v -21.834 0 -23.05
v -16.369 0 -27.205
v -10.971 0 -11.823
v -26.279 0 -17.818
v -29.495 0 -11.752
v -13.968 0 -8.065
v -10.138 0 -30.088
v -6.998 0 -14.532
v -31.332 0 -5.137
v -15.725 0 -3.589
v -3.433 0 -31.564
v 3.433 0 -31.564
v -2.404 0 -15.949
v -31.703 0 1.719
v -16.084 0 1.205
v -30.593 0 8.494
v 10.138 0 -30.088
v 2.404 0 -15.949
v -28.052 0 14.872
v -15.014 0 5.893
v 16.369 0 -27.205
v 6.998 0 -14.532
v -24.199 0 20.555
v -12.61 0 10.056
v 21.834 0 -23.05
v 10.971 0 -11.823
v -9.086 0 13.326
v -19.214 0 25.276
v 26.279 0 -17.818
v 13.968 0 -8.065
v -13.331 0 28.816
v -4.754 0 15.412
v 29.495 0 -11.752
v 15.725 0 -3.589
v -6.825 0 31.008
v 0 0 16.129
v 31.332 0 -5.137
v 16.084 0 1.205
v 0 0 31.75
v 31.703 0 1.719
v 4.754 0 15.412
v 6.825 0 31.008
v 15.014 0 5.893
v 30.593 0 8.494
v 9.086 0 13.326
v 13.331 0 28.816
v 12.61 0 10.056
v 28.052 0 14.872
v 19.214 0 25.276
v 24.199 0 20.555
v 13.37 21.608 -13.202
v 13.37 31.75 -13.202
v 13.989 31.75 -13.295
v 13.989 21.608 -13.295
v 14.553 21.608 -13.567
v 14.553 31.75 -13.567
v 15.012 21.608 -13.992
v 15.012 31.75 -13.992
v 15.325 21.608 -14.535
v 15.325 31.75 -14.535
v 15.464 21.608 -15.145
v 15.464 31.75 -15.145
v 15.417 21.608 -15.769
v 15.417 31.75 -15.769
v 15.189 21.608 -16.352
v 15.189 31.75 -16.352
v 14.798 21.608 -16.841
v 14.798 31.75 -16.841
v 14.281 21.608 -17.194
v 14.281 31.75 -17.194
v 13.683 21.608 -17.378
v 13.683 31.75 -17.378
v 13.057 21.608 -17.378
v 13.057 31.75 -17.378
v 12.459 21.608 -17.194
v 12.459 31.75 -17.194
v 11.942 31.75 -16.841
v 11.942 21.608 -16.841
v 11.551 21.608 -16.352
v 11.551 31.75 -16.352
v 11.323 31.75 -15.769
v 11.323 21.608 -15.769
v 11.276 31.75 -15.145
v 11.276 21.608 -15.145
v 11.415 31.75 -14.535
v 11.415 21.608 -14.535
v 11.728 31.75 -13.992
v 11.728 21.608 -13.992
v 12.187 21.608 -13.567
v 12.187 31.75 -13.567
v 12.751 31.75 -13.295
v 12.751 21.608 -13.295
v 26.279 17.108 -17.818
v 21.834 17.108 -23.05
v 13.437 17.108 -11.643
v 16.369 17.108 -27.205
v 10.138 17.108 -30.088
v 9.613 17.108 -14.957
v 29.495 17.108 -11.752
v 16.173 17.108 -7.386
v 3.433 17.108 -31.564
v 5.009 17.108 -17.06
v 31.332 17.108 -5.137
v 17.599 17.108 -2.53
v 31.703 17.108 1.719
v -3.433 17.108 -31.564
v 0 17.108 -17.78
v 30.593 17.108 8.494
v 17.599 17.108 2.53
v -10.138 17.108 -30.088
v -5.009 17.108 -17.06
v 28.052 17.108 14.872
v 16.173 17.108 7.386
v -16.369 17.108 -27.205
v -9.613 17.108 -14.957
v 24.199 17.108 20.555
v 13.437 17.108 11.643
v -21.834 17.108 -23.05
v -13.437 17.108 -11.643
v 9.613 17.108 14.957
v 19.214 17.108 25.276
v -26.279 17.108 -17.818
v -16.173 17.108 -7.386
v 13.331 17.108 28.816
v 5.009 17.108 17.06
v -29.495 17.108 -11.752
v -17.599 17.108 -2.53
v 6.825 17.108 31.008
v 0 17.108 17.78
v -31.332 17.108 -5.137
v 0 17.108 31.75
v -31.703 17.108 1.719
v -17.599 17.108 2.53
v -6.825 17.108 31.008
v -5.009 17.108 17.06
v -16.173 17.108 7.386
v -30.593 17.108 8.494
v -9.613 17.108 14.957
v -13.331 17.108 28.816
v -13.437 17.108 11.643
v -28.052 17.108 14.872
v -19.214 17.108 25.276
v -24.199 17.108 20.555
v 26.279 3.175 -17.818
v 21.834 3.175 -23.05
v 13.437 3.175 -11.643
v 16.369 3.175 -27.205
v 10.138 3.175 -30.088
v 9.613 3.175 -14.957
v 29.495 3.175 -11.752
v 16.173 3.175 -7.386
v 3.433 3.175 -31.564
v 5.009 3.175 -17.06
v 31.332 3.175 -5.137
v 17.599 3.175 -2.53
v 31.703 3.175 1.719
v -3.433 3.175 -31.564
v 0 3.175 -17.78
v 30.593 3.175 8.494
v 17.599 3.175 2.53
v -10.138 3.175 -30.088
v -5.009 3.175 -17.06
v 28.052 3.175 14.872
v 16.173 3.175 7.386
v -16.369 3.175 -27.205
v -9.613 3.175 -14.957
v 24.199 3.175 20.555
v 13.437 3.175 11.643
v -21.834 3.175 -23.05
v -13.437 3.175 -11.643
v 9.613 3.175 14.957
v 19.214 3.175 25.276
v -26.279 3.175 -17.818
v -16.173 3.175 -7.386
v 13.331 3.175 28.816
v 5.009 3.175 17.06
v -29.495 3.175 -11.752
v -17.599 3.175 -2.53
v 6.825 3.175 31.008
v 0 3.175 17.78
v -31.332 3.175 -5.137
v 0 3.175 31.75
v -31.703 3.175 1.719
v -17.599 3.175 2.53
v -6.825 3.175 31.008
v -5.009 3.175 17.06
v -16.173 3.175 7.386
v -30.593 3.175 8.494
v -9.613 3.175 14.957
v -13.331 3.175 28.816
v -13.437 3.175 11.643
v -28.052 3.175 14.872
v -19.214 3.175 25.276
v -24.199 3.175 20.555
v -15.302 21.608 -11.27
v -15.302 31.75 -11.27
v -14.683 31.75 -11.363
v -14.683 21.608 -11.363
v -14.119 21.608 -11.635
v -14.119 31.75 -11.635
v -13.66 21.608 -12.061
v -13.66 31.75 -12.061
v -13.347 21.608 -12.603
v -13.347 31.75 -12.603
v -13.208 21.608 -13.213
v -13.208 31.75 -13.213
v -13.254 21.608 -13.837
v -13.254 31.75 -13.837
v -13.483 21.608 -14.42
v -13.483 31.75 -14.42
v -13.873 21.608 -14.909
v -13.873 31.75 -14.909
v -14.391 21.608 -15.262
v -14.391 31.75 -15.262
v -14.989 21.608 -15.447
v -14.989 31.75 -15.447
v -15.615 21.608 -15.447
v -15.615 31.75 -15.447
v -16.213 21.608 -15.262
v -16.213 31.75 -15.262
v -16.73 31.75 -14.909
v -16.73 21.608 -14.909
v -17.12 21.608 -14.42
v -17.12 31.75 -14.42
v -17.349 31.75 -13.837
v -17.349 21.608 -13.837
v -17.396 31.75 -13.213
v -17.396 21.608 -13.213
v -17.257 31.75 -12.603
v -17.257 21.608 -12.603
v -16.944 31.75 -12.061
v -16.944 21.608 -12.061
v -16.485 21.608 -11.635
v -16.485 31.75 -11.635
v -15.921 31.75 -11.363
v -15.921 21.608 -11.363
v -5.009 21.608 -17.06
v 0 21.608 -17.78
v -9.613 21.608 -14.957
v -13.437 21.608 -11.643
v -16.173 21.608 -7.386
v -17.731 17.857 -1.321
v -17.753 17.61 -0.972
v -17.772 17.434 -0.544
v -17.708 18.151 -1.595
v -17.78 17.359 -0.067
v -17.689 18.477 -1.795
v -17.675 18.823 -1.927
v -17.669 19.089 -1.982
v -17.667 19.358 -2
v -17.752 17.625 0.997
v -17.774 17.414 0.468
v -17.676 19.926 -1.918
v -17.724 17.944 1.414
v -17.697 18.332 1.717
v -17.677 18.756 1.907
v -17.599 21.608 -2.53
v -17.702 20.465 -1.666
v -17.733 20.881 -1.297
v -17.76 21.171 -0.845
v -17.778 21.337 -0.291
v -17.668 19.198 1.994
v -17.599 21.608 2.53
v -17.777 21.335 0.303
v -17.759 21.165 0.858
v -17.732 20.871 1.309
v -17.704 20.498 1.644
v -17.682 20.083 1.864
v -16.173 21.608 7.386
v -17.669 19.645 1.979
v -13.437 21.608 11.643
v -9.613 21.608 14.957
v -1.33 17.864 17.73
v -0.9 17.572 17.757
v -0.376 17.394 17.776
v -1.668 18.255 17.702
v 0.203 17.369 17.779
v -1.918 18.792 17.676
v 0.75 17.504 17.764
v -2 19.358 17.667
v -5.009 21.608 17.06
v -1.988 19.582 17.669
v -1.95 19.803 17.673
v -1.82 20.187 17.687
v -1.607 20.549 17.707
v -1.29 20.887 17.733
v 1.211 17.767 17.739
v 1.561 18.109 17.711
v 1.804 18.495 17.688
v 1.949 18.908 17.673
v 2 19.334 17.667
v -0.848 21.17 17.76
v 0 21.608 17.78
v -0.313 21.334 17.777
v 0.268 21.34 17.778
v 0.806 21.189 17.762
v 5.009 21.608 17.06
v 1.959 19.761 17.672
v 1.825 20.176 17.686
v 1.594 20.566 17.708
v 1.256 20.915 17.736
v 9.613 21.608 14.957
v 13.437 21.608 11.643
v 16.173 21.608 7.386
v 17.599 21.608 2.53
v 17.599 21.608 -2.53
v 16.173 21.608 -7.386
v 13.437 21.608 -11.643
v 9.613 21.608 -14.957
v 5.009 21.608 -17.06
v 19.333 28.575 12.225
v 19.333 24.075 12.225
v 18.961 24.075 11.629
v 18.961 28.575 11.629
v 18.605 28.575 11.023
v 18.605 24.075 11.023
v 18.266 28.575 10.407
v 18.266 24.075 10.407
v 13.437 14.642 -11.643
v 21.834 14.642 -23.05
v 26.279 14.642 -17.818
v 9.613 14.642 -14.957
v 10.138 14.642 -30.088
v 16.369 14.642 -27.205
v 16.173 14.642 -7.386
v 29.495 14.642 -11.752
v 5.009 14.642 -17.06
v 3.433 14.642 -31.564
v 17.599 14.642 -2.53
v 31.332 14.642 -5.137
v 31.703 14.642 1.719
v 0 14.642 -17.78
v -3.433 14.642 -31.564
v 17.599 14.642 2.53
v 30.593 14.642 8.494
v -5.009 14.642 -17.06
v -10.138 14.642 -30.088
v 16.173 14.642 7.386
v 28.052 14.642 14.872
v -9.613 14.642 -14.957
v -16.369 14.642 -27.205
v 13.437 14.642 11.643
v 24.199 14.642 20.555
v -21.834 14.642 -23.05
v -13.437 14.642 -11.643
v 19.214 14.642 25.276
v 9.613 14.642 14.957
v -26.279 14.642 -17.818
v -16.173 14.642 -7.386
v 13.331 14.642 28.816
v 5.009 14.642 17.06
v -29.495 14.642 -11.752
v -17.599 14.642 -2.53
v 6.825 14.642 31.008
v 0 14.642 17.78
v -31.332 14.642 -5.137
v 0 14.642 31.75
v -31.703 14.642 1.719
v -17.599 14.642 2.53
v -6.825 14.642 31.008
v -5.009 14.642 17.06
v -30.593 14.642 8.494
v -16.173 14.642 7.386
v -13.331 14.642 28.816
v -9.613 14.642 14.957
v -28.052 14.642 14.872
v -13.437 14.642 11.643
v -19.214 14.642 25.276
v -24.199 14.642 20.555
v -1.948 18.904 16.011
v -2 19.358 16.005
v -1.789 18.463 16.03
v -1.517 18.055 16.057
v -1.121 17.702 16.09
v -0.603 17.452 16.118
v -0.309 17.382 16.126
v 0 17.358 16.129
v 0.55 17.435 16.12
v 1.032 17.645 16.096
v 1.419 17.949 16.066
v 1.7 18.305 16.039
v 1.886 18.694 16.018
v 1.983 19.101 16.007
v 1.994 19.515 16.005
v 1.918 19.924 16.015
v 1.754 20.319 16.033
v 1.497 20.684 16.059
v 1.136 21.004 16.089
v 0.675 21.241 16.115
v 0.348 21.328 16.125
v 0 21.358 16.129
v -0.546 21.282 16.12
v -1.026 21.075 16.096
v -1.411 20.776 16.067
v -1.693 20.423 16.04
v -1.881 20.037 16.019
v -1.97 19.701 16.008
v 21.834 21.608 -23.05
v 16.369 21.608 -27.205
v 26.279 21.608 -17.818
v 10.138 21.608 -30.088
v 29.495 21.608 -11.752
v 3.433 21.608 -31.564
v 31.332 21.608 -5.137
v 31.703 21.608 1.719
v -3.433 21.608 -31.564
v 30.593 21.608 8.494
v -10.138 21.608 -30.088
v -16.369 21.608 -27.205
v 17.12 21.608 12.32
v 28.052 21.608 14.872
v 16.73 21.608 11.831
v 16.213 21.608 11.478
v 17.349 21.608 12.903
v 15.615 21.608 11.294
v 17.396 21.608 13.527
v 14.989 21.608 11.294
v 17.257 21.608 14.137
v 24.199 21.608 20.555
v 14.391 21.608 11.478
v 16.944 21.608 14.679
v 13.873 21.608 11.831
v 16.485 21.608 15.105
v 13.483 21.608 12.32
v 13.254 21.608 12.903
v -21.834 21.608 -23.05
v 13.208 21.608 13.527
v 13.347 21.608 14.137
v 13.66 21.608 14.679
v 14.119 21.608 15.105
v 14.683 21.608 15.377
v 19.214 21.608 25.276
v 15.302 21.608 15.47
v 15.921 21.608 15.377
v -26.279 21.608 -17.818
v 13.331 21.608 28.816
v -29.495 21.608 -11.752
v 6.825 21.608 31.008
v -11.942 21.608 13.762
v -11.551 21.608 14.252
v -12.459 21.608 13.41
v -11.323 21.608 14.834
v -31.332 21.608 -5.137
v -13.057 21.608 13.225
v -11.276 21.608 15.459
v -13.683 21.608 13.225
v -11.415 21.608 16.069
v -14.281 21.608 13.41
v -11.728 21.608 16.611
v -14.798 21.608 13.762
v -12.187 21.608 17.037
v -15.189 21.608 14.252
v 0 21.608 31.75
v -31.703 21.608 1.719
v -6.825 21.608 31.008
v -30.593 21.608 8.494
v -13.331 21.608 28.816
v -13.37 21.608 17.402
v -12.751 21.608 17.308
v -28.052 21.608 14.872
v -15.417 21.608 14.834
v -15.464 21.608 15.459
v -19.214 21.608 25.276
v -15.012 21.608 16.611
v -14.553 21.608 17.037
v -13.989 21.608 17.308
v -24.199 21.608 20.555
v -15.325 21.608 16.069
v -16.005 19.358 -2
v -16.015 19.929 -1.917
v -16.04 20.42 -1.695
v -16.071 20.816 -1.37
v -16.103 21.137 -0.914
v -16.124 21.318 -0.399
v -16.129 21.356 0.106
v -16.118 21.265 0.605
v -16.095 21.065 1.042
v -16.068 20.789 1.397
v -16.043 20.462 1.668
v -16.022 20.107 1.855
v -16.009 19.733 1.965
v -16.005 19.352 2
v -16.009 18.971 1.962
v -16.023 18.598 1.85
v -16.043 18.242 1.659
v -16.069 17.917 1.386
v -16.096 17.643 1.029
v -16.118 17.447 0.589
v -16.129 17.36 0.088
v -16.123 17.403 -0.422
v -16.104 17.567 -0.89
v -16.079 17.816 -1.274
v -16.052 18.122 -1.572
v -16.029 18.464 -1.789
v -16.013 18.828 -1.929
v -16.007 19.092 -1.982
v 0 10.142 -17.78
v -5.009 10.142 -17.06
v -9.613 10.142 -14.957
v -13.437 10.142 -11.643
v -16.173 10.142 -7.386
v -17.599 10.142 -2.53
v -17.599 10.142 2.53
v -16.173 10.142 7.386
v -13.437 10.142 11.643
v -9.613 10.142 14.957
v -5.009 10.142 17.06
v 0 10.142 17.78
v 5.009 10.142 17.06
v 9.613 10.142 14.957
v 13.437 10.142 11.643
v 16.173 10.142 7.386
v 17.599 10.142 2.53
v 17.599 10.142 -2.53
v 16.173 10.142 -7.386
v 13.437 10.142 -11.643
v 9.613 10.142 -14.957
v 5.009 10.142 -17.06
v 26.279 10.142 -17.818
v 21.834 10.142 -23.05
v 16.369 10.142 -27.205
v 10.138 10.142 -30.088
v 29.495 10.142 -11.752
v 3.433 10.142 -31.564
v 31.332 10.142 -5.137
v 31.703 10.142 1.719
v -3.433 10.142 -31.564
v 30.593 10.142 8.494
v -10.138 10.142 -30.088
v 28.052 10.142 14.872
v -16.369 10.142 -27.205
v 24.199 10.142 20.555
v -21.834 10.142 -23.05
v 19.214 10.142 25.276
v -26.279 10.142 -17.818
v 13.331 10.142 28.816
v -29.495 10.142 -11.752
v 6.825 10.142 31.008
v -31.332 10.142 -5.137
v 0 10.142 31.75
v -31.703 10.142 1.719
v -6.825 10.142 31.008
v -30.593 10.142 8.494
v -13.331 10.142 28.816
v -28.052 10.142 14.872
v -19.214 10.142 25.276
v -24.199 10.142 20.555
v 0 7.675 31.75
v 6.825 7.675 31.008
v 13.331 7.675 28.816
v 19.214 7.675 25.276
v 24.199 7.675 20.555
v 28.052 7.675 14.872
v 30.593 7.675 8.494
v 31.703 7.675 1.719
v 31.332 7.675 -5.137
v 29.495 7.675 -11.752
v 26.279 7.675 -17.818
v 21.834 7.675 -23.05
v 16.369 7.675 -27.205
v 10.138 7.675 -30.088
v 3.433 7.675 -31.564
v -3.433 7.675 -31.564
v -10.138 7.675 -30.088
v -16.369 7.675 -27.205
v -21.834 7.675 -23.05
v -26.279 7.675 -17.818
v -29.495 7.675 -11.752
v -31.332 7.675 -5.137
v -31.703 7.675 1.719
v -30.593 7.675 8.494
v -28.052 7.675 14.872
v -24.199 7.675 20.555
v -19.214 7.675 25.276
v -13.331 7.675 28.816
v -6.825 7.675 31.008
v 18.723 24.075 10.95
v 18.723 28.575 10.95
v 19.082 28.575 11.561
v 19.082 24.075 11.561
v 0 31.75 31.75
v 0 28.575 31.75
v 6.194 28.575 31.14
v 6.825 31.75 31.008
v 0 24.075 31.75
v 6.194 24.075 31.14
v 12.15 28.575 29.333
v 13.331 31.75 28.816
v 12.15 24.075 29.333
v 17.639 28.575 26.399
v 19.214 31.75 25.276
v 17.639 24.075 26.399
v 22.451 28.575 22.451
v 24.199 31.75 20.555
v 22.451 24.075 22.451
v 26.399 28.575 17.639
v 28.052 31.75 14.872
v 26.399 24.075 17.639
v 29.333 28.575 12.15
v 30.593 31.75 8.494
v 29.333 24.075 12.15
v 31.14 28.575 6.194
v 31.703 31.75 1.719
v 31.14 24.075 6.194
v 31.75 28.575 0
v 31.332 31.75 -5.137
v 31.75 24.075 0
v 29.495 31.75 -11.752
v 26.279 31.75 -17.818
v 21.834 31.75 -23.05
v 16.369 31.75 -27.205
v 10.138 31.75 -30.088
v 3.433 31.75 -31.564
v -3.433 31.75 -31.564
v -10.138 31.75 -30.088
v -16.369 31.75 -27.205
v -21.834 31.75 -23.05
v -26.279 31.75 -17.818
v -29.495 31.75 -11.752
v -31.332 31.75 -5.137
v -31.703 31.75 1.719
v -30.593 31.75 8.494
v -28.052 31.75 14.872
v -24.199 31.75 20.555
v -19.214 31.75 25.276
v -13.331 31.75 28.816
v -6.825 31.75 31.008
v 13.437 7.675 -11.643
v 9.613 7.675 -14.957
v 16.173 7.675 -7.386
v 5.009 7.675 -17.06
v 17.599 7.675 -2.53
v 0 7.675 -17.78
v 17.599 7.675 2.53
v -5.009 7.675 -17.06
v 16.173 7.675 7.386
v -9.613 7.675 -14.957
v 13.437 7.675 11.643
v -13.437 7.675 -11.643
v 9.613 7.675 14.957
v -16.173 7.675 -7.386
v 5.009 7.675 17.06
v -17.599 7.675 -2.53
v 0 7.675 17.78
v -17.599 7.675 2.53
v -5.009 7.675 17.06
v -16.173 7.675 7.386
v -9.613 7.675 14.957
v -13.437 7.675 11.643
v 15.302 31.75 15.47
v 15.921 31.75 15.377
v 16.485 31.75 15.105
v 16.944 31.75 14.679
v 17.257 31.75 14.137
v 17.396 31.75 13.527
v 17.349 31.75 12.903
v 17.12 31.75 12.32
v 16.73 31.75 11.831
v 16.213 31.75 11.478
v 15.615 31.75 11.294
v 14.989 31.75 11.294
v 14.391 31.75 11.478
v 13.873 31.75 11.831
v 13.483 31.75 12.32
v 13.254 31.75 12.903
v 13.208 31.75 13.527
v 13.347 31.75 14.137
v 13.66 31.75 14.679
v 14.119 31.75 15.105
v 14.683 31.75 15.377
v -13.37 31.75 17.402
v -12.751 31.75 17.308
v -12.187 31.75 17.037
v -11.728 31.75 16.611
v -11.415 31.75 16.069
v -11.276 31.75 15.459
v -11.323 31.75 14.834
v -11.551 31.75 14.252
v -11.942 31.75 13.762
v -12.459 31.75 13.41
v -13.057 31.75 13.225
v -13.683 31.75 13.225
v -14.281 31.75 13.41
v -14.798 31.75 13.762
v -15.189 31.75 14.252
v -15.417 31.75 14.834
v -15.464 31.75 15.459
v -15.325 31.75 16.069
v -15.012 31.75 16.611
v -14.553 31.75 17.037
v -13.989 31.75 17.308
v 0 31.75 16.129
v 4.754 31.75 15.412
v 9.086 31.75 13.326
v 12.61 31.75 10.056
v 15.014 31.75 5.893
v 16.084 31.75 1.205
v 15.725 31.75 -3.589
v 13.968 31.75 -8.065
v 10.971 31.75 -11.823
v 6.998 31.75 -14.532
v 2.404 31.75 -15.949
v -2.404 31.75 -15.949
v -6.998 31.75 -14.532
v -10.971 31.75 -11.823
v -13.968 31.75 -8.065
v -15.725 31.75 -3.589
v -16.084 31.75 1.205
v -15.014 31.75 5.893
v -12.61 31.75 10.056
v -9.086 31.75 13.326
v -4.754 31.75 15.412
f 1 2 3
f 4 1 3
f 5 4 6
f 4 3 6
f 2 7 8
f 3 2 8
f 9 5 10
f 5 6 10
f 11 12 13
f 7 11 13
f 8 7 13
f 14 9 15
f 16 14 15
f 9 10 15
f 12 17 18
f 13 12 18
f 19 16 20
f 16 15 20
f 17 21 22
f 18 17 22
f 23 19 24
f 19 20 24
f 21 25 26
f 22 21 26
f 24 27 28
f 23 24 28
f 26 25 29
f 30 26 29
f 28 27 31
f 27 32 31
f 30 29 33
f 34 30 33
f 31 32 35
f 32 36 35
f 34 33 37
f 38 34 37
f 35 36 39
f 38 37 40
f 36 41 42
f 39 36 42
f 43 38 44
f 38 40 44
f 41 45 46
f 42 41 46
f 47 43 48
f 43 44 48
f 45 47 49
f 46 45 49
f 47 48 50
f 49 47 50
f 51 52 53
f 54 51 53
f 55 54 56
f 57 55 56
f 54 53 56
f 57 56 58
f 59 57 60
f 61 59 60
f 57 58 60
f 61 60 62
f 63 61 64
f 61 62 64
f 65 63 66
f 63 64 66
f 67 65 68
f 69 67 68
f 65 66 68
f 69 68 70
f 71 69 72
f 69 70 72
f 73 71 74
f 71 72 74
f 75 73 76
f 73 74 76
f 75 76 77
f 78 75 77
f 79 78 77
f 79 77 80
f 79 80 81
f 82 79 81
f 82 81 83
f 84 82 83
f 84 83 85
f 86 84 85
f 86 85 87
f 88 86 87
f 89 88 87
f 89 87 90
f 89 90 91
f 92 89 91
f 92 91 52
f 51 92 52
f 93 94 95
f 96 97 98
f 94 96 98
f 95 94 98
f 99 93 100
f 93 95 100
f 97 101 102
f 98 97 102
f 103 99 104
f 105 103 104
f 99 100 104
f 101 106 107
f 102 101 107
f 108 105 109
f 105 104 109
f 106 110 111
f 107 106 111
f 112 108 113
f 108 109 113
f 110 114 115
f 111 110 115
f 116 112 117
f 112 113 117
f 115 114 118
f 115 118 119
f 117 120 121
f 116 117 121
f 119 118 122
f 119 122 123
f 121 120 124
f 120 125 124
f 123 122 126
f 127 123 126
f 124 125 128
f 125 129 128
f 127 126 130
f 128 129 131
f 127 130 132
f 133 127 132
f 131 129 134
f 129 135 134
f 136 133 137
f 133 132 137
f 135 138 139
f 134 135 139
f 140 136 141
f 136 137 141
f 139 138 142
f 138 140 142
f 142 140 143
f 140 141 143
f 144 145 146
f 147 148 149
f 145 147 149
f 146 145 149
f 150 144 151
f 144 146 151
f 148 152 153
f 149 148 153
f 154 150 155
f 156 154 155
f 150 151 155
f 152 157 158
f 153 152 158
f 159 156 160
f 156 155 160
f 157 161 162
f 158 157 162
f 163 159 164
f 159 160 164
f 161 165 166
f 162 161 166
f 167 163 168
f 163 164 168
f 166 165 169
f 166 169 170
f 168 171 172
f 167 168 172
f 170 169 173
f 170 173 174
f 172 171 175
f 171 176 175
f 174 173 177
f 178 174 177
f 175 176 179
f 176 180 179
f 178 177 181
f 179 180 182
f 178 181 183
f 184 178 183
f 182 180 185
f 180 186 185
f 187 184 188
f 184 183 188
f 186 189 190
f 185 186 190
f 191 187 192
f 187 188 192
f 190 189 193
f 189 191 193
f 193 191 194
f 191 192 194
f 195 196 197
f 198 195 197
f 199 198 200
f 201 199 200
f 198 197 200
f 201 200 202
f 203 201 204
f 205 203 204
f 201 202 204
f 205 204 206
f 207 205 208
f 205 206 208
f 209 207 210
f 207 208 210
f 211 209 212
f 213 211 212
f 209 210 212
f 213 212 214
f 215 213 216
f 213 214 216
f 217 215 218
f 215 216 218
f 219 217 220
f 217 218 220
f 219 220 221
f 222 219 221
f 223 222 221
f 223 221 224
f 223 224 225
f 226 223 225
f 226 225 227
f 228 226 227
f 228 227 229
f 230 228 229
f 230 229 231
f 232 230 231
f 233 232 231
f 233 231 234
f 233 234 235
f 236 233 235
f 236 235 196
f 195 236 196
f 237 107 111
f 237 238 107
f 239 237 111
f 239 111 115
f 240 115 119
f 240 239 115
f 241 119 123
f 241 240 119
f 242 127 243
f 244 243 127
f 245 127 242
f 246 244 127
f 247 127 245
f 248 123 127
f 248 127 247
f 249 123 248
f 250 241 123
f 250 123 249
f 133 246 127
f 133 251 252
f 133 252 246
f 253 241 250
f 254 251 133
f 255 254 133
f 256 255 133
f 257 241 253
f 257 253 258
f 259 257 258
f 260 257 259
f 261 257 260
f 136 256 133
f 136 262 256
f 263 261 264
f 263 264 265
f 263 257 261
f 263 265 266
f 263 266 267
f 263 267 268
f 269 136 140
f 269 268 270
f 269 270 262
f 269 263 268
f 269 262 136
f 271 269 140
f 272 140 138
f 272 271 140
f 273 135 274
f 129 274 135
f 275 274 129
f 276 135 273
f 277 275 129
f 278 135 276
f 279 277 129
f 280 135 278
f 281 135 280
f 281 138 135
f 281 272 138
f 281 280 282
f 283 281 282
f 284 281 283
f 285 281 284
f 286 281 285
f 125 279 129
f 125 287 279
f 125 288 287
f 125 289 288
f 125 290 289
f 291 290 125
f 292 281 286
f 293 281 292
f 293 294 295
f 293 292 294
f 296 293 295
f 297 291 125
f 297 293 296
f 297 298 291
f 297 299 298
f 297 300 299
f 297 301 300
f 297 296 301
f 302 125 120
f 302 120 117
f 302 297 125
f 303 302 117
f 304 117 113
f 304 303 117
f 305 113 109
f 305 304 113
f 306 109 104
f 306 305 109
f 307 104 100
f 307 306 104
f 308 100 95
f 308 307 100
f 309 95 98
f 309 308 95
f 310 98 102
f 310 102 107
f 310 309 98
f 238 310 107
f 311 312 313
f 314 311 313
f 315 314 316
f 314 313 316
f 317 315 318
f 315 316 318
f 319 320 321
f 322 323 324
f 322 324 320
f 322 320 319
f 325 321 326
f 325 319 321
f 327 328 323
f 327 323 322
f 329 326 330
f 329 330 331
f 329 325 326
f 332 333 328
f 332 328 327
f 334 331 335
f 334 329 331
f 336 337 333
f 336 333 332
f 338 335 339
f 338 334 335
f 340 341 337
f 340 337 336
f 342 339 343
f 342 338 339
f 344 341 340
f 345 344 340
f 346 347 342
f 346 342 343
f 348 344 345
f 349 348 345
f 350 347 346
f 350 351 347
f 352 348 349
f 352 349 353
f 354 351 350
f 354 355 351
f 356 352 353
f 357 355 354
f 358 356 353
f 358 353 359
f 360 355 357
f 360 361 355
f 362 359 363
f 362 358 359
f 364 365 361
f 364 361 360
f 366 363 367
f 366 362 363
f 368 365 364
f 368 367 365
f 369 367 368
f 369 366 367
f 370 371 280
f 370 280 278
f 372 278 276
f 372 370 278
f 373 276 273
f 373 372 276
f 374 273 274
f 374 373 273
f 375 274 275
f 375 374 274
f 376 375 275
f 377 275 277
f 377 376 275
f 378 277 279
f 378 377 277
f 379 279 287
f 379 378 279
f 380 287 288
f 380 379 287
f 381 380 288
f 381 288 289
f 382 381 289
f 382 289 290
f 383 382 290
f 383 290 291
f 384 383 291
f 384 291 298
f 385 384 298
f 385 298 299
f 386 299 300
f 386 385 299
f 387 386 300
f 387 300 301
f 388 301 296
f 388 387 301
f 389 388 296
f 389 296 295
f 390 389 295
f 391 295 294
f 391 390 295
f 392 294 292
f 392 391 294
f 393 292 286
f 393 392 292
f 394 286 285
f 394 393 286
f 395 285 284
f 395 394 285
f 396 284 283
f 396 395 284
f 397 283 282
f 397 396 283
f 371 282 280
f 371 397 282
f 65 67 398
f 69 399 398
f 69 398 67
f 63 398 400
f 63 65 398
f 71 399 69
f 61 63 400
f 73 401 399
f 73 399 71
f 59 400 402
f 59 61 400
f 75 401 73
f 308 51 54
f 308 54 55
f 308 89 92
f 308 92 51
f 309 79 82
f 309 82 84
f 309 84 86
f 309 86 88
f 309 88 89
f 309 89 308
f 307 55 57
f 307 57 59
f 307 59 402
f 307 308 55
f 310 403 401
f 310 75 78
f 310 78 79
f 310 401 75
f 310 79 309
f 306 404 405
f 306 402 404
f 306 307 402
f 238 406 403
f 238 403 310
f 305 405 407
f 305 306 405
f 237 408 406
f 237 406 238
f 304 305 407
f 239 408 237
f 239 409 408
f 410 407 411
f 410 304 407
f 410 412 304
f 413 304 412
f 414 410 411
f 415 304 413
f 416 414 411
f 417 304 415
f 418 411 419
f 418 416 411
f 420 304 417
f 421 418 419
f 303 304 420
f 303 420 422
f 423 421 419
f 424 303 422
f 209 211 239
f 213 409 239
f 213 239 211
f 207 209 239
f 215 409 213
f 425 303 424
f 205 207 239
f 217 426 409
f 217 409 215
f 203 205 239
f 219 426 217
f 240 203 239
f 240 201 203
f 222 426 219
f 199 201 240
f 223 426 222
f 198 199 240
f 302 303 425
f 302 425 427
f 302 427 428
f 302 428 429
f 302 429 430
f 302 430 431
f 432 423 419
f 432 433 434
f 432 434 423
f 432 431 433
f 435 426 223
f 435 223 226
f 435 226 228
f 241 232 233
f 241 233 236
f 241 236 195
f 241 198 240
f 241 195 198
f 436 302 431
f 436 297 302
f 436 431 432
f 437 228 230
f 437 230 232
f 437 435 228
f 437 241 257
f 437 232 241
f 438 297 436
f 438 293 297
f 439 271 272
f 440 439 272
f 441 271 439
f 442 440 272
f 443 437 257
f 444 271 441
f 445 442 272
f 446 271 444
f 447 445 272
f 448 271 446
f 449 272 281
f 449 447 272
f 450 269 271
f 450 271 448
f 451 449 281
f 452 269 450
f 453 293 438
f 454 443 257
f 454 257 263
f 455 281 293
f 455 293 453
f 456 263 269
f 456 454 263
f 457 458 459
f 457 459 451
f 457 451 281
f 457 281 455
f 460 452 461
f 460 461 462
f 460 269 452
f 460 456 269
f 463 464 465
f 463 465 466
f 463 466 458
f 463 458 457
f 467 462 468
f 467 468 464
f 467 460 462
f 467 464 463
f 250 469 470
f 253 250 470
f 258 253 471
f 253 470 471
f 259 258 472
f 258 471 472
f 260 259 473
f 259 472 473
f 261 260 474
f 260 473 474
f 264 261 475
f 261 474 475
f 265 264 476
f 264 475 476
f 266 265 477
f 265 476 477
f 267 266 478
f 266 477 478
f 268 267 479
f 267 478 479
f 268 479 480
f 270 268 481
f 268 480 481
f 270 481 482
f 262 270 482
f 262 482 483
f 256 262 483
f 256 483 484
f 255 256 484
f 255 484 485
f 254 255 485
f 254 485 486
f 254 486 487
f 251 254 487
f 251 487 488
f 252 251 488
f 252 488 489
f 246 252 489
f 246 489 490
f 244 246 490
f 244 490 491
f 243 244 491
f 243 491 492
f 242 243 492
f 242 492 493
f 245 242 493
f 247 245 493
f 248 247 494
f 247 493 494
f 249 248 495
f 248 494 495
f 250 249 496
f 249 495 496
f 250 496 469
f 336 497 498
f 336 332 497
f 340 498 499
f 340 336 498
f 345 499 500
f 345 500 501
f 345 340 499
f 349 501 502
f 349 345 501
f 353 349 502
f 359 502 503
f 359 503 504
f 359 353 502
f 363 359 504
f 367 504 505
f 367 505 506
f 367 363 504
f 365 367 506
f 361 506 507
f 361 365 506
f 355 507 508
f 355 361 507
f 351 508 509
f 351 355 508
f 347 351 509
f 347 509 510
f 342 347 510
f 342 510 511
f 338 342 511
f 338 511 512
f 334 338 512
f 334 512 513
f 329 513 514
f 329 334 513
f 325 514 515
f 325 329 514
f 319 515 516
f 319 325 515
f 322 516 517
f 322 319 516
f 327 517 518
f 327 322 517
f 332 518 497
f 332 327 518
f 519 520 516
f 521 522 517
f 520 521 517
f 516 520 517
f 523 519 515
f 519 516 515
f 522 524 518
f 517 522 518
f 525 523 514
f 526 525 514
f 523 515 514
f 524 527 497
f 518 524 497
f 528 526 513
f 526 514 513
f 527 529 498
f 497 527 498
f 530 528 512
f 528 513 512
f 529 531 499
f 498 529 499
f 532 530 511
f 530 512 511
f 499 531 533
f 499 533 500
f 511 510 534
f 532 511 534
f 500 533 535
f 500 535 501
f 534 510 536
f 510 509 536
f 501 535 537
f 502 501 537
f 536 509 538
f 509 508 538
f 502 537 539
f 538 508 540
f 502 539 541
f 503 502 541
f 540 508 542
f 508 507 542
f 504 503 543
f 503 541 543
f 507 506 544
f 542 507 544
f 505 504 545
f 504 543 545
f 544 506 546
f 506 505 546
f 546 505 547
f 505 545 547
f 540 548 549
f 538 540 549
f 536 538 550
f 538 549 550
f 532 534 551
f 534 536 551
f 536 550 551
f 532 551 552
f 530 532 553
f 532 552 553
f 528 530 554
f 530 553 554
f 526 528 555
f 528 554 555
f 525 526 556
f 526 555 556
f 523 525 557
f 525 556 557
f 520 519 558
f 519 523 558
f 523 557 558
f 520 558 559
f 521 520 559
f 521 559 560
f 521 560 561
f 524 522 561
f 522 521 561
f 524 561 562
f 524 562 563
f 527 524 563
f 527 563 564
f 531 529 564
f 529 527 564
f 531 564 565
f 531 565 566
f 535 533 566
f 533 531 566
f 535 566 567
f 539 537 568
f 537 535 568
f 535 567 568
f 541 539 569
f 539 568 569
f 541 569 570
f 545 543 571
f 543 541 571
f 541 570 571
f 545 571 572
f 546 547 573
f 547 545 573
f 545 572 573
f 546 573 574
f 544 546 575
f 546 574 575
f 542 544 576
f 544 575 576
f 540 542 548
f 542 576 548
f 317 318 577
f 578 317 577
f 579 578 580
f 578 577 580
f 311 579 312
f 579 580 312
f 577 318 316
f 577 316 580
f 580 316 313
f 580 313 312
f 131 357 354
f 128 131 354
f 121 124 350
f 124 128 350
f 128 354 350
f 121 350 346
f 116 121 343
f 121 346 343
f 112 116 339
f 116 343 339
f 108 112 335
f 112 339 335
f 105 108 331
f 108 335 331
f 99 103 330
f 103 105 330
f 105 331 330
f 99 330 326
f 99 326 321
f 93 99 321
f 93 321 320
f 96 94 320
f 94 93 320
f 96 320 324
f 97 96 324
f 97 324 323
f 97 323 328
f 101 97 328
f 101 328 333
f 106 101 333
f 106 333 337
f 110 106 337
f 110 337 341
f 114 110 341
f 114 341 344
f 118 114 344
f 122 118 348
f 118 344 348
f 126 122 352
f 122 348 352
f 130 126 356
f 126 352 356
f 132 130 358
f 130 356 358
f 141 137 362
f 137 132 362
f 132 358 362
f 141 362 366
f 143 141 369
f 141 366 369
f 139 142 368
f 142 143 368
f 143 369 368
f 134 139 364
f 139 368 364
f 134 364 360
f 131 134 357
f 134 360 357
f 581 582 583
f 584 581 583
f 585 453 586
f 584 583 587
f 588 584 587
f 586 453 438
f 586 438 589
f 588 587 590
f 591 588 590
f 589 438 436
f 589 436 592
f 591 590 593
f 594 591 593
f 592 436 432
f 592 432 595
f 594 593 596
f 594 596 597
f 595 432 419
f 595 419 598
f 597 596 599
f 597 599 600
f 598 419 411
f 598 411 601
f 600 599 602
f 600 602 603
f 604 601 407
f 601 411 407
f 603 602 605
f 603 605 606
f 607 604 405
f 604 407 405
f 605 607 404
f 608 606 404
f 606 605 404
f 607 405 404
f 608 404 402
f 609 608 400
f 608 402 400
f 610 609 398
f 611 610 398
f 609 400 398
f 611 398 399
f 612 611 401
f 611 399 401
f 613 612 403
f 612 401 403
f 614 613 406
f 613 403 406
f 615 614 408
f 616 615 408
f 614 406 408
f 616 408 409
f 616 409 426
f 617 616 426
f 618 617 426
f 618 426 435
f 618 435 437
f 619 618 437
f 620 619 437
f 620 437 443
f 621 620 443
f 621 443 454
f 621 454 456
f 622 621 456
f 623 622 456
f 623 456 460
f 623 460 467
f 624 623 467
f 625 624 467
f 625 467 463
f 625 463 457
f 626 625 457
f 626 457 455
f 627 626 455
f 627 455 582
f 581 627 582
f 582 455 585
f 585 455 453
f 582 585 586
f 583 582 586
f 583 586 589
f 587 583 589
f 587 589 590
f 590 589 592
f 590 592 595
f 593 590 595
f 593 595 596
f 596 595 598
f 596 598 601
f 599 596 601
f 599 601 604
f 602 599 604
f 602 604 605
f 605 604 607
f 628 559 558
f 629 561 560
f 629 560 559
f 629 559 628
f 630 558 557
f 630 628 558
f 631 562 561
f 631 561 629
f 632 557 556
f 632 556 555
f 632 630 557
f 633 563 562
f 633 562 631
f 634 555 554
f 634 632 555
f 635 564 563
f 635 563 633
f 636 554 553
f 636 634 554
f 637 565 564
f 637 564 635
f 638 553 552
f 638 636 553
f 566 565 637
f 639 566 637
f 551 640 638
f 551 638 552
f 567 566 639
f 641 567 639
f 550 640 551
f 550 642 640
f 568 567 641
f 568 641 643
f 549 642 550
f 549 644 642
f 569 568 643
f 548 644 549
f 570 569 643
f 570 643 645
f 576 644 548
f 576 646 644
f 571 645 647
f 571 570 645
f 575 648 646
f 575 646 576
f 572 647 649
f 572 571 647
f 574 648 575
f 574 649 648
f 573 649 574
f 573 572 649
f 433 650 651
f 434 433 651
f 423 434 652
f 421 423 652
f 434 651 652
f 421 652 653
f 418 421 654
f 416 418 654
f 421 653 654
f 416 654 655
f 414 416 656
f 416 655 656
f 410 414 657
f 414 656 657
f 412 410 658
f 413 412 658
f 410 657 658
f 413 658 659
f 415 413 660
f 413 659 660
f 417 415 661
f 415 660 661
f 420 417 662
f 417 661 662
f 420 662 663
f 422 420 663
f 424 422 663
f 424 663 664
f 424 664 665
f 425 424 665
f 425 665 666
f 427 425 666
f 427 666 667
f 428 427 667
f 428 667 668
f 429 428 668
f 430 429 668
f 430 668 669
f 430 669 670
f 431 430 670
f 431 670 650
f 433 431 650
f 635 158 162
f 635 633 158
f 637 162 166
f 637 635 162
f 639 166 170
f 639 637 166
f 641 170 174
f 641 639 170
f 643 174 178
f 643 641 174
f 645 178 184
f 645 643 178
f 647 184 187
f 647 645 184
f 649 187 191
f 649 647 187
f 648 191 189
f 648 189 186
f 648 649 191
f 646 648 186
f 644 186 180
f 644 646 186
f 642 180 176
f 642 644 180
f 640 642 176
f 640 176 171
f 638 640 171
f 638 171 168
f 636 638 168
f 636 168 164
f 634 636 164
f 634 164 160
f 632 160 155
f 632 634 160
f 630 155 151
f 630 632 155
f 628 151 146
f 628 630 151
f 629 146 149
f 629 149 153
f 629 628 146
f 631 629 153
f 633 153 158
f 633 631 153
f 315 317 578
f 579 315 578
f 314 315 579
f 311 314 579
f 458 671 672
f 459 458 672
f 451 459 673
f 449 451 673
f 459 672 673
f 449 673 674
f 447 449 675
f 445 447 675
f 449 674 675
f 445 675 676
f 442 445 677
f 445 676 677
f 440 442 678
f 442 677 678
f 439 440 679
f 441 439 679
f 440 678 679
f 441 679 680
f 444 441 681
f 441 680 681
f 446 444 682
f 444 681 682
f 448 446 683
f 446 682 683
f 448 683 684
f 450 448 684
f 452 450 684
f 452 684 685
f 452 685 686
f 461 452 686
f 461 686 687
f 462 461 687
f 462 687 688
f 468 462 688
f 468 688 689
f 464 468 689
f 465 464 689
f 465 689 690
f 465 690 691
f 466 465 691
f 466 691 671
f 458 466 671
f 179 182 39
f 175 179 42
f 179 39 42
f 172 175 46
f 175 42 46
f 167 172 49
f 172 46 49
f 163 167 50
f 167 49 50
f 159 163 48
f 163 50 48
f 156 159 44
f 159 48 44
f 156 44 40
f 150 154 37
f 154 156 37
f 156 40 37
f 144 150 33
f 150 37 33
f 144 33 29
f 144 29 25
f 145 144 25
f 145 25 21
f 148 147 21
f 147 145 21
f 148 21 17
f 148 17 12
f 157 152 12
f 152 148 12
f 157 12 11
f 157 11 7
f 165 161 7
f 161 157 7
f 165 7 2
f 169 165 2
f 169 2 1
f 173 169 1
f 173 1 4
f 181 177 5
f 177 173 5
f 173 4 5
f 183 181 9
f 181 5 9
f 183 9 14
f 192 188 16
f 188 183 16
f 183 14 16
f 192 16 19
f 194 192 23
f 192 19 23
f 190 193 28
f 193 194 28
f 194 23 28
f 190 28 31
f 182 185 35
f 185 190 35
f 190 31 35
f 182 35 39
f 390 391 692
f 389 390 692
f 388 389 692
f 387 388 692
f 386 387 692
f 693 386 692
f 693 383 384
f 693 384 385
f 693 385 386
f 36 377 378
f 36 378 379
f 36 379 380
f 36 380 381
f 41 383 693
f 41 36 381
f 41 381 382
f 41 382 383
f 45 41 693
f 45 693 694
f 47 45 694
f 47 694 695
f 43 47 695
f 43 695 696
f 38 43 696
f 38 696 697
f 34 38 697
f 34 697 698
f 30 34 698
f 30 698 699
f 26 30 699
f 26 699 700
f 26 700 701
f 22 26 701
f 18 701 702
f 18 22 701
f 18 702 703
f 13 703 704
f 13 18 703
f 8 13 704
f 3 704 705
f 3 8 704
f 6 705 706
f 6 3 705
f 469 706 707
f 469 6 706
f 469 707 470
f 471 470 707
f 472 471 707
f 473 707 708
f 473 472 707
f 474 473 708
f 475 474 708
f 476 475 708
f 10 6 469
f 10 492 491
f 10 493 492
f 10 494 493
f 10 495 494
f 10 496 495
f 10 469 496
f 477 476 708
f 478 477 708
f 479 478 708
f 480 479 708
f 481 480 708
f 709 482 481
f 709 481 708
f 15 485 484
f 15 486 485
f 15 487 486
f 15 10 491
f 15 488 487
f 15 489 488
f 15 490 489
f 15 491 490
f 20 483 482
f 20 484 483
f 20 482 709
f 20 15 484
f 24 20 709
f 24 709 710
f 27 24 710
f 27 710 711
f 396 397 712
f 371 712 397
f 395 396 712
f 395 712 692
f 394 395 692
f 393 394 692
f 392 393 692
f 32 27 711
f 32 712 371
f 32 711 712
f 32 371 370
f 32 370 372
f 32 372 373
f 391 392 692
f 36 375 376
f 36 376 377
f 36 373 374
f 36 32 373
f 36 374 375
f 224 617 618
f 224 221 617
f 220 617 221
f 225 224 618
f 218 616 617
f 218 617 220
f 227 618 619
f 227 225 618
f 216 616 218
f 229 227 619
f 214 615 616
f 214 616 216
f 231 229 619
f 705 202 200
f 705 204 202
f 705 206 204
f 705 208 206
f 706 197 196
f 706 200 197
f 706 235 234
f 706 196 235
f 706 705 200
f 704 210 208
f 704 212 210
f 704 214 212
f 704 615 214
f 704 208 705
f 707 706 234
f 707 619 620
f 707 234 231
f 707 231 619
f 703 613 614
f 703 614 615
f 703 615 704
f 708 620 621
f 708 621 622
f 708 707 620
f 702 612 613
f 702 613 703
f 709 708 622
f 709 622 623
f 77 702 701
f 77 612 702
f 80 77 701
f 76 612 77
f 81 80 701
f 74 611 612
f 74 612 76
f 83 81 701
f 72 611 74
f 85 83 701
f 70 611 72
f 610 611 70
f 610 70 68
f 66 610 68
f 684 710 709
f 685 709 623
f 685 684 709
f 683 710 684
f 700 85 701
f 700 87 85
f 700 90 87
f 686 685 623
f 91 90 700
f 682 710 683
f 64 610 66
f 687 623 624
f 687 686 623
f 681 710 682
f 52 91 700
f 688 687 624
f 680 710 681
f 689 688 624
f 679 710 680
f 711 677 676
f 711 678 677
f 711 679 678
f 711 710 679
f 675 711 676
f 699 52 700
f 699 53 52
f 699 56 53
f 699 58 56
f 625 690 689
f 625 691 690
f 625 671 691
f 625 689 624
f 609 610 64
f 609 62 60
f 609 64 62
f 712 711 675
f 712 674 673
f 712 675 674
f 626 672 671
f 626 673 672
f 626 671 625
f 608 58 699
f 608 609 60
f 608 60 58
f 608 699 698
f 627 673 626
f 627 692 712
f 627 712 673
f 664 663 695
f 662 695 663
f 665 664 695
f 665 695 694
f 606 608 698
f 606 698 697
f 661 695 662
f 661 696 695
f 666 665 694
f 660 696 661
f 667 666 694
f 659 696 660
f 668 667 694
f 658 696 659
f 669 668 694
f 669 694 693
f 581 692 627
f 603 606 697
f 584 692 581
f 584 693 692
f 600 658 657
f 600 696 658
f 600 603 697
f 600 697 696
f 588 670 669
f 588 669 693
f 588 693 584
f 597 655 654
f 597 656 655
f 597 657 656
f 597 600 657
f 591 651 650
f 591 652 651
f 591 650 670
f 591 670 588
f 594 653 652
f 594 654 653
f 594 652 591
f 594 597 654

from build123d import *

# Parameters (mm, degrees)
SKETCH1_R                        = 31.75
SKETCH1_R_2                      = 16.129
BOSS_EXTRUDE1_DEPTH              = 31.75
SKETCH2_W                        = 13.97
SKETCH2_H                        = 4.5
BOSS_EXTRUDE2_START              = -7.675
BOSS_EXTRUDE2_OUTLINE_R          = 31.75
BOSS_EXTRUDE2_OUTLINE_R_2        = 17.78
BOSS_EXTRUDE2_DEPTH              = 4.5
CUT_EXTRUDE2_REACH               = 56.993
CUT_EXTRUDE2_END_RADIUS          = 17.78
SKETCH8_R                        = 2
CUT_EXTRUDE3_REACH               = 56.993
CUT_EXTRUDE3_END_RADIUS          = 17.78
SKETCH9_R                        = 2
SKETCH10_R                       = 1
CUT_EXTRUDE4_DEPTH               = 10.141666667
TAP_DRILL_FOR_M5X0_8_TAP1_REACH  = 74.51
TAP_DRILL_FOR_M5X0_8_TAP1_BORE_R = 2.1


# Read off the part's stored shape, not the designer's step: Boss-Extrude2
with BuildPart() as part:
    # Sketch1 → Boss-Extrude1 (new body)
    with BuildSketch(Plane(origin=(0, 0, 0), x_dir=(1, 0, 0), z_dir=(0, 1, 0))):
        with Locations(Location((0, 0, 0), (0, 0, 270))):
            Circle(SKETCH1_R)
        with Locations(Location((0, 0, 0), (0, 0, 270))):
            Circle(SKETCH1_R_2, mode=Mode.SUBTRACT)
    extrude(amount=BOSS_EXTRUDE1_DEPTH)

    # Sketch2 → Cut-Revolve2 (revolve, cut)
    with BuildSketch(Plane.XY, mode=Mode.PRIVATE) as cut_revolve2_sk:
        with Locations((24.765, 26.325)):
            Rectangle(SKETCH2_W, SKETCH2_H)
        with Locations((24.765, 12.391666667)):
            Rectangle(SKETCH2_W, SKETCH2_H)
        with Locations((24.765, 5.425)):
            Rectangle(SKETCH2_W, SKETCH2_H)
        with Locations((24.765, 19.358333333)):
            Rectangle(SKETCH2_W, SKETCH2_H)
    revolve(cut_revolve2_sk.sketch.rotate(Axis((0, 0, 0), (0, 1, 0)), 90), axis=Axis((0, 0, 0), (0, 1, 0)), mode=Mode.SUBTRACT)

    # Boss-Extrude2 outline → Boss-Extrude2 (add)
    with BuildSketch(Plane(origin=(0, 31.75, 0), x_dir=(1, 0, 0), z_dir=(0, 1, 0)).offset(BOSS_EXTRUDE2_START)):
        Circle(BOSS_EXTRUDE2_OUTLINE_R)
        with BuildLine():
            ThreePointArc((18.265610967, -10.406997066), (18.915681572, -11.247857531), (19.33332562, -12.225206784))
            ThreePointArc((19.33332562, -12.225206784), (18.780593277, -11.327185978), (18.265610967, -10.406997066))
        make_face(mode=Mode.SUBTRACT)
        Circle(BOSS_EXTRUDE2_OUTLINE_R_2, mode=Mode.SUBTRACT)
    extrude(amount=BOSS_EXTRUDE2_DEPTH)

    # Cut-Extrude2: up to this cylinder (the profile starts inside it)
    cut_extrude2_end = Plane(origin=(0, 19.358333, 0), z_dir=(0, -1, 0)) * Cylinder(CUT_EXTRUDE2_END_RADIUS, 150.546, mode=Mode.PRIVATE)
    # Sketch8 → Cut-Extrude2 (cut, up to the surface)
    with BuildSketch(Plane.XY, mode=Mode.PRIVATE) as cut_extrude2_sk1:
        with Locations(Location((0, 19.358333333, 0), (0, 0, 180))):
            Circle(SKETCH8_R)
    cut_extrude2_tool1 = extrude(cut_extrude2_sk1.sketch, amount=CUT_EXTRUDE2_REACH, mode=Mode.PRIVATE) & cut_extrude2_end
    add(cut_extrude2_tool1.solids().sort_by_distance((0, 19.358333, 0))[0], mode=Mode.SUBTRACT)

    # Cut-Extrude3: up to this cylinder (the profile starts inside it)
    cut_extrude3_end = Plane(origin=(0, 19.358333, 0), z_dir=(0, -1, 0)) * Cylinder(CUT_EXTRUDE3_END_RADIUS, 150.546, mode=Mode.PRIVATE)
    # Sketch9 → Cut-Extrude3 (cut, up to the surface)
    with BuildSketch(Plane(origin=(0, 0, 0), x_dir=(0, 0, -1), z_dir=(1, 0, 0)), mode=Mode.PRIVATE) as cut_extrude3_sk1:
        with Locations((0, 19.358333333)):
            Circle(SKETCH9_R)
    cut_extrude3_tool1 = extrude(cut_extrude3_sk1.sketch, amount=-CUT_EXTRUDE3_REACH, mode=Mode.PRIVATE) & cut_extrude3_end
    add(cut_extrude3_tool1.solids().sort_by_distance((0, 19.358333, 0))[0], mode=Mode.SUBTRACT)

    # Sketch10 → Cut-Extrude4 (cut)
    with BuildSketch(Plane(origin=(0, 31.75, 0), x_dir=(1, 0, 0), z_dir=(0, 1, 0))):
        with Locations(Location((15.301734948, -13.370090036, 0), (0, 0, 270))):
            Circle(SKETCH10_R)
        with Locations(Location((13.370090036, 15.301734948, 0), (0, 0, 270))):
            Circle(SKETCH10_R)
        with Locations(Location((-15.301734948, 13.370090036, 0), (0, 0, 270))):
            Circle(SKETCH10_R)
        with Locations(Location((-13.370090036, -15.301734948, 0), (0, 0, 270))):
            Circle(SKETCH10_R)
    extrude(amount=-CUT_EXTRUDE4_DEPTH, mode=Mode.SUBTRACT)

    # Tap Drill for M5x0.8 Tap1 bore (on position points) → Tap Drill for M5x0.8 Tap1 (cut, up to next)
    with BuildSketch(Plane(origin=(15.301734948, 31.75, 13.370090036), x_dir=(0, 0, 1), z_dir=(0, 1, 0)), mode=Mode.PRIVATE) as tap_drill_for_m5x0_8_tap1_sk1:
        Circle(TAP_DRILL_FOR_M5X0_8_TAP1_BORE_R)
    tap_drill_for_m5x0_8_tap1_tool1 = extrude(tap_drill_for_m5x0_8_tap1_sk1.sketch, amount=-TAP_DRILL_FOR_M5X0_8_TAP1_REACH, mode=Mode.PRIVATE) & part.part
    # Tap Drill for M5x0.8 Tap1 bore (on position points) → Tap Drill for M5x0.8 Tap1 (cut, up to next)
    with BuildSketch(Plane(origin=(15.301734948, 31.75, 13.370090036), x_dir=(0, 0, 1), z_dir=(0, 1, 0)), mode=Mode.PRIVATE) as tap_drill_for_m5x0_8_tap1_sk2:
        with Locations((1.931644912, -28.671824984)):
            Circle(TAP_DRILL_FOR_M5X0_8_TAP1_BORE_R)
    tap_drill_for_m5x0_8_tap1_tool2 = extrude(tap_drill_for_m5x0_8_tap1_sk2.sketch, amount=-TAP_DRILL_FOR_M5X0_8_TAP1_REACH, mode=Mode.PRIVATE) & part.part
    # Tap Drill for M5x0.8 Tap1 bore (on position points) → Tap Drill for M5x0.8 Tap1 (cut, up to next)
    with BuildSketch(Plane(origin=(15.301734948, 31.75, 13.370090036), x_dir=(0, 0, 1), z_dir=(0, 1, 0)), mode=Mode.PRIVATE) as tap_drill_for_m5x0_8_tap1_sk3:
        with Locations((-26.740180072, -30.603469896)):
            Circle(TAP_DRILL_FOR_M5X0_8_TAP1_BORE_R)
    tap_drill_for_m5x0_8_tap1_tool3 = extrude(tap_drill_for_m5x0_8_tap1_sk3.sketch, amount=-TAP_DRILL_FOR_M5X0_8_TAP1_REACH, mode=Mode.PRIVATE) & part.part
    # Tap Drill for M5x0.8 Tap1 bore (on position points) → Tap Drill for M5x0.8 Tap1 (cut, up to next)
    with BuildSketch(Plane(origin=(15.301734948, 31.75, 13.370090036), x_dir=(0, 0, 1), z_dir=(0, 1, 0)), mode=Mode.PRIVATE) as tap_drill_for_m5x0_8_tap1_sk4:
        with Locations((-28.671824984, -1.931644912)):
            Circle(TAP_DRILL_FOR_M5X0_8_TAP1_BORE_R)
    tap_drill_for_m5x0_8_tap1_tool4 = extrude(tap_drill_for_m5x0_8_tap1_sk4.sketch, amount=-TAP_DRILL_FOR_M5X0_8_TAP1_REACH, mode=Mode.PRIVATE) & part.part
    add(tap_drill_for_m5x0_8_tap1_tool1.solids().sort_by_distance((15.301735, 31.75, 13.37009))[0], mode=Mode.SUBTRACT)
    add(tap_drill_for_m5x0_8_tap1_tool2.solids().sort_by_distance((-13.37009, 31.75, 15.301735))[0], mode=Mode.SUBTRACT)
    add(tap_drill_for_m5x0_8_tap1_tool3.solids().sort_by_distance((-15.301735, 31.75, -13.37009))[0], mode=Mode.SUBTRACT)
    add(tap_drill_for_m5x0_8_tap1_tool4.solids().sort_by_distance((13.37009, 31.75, -15.301735))[0], mode=Mode.SUBTRACT)


solid = part.part
